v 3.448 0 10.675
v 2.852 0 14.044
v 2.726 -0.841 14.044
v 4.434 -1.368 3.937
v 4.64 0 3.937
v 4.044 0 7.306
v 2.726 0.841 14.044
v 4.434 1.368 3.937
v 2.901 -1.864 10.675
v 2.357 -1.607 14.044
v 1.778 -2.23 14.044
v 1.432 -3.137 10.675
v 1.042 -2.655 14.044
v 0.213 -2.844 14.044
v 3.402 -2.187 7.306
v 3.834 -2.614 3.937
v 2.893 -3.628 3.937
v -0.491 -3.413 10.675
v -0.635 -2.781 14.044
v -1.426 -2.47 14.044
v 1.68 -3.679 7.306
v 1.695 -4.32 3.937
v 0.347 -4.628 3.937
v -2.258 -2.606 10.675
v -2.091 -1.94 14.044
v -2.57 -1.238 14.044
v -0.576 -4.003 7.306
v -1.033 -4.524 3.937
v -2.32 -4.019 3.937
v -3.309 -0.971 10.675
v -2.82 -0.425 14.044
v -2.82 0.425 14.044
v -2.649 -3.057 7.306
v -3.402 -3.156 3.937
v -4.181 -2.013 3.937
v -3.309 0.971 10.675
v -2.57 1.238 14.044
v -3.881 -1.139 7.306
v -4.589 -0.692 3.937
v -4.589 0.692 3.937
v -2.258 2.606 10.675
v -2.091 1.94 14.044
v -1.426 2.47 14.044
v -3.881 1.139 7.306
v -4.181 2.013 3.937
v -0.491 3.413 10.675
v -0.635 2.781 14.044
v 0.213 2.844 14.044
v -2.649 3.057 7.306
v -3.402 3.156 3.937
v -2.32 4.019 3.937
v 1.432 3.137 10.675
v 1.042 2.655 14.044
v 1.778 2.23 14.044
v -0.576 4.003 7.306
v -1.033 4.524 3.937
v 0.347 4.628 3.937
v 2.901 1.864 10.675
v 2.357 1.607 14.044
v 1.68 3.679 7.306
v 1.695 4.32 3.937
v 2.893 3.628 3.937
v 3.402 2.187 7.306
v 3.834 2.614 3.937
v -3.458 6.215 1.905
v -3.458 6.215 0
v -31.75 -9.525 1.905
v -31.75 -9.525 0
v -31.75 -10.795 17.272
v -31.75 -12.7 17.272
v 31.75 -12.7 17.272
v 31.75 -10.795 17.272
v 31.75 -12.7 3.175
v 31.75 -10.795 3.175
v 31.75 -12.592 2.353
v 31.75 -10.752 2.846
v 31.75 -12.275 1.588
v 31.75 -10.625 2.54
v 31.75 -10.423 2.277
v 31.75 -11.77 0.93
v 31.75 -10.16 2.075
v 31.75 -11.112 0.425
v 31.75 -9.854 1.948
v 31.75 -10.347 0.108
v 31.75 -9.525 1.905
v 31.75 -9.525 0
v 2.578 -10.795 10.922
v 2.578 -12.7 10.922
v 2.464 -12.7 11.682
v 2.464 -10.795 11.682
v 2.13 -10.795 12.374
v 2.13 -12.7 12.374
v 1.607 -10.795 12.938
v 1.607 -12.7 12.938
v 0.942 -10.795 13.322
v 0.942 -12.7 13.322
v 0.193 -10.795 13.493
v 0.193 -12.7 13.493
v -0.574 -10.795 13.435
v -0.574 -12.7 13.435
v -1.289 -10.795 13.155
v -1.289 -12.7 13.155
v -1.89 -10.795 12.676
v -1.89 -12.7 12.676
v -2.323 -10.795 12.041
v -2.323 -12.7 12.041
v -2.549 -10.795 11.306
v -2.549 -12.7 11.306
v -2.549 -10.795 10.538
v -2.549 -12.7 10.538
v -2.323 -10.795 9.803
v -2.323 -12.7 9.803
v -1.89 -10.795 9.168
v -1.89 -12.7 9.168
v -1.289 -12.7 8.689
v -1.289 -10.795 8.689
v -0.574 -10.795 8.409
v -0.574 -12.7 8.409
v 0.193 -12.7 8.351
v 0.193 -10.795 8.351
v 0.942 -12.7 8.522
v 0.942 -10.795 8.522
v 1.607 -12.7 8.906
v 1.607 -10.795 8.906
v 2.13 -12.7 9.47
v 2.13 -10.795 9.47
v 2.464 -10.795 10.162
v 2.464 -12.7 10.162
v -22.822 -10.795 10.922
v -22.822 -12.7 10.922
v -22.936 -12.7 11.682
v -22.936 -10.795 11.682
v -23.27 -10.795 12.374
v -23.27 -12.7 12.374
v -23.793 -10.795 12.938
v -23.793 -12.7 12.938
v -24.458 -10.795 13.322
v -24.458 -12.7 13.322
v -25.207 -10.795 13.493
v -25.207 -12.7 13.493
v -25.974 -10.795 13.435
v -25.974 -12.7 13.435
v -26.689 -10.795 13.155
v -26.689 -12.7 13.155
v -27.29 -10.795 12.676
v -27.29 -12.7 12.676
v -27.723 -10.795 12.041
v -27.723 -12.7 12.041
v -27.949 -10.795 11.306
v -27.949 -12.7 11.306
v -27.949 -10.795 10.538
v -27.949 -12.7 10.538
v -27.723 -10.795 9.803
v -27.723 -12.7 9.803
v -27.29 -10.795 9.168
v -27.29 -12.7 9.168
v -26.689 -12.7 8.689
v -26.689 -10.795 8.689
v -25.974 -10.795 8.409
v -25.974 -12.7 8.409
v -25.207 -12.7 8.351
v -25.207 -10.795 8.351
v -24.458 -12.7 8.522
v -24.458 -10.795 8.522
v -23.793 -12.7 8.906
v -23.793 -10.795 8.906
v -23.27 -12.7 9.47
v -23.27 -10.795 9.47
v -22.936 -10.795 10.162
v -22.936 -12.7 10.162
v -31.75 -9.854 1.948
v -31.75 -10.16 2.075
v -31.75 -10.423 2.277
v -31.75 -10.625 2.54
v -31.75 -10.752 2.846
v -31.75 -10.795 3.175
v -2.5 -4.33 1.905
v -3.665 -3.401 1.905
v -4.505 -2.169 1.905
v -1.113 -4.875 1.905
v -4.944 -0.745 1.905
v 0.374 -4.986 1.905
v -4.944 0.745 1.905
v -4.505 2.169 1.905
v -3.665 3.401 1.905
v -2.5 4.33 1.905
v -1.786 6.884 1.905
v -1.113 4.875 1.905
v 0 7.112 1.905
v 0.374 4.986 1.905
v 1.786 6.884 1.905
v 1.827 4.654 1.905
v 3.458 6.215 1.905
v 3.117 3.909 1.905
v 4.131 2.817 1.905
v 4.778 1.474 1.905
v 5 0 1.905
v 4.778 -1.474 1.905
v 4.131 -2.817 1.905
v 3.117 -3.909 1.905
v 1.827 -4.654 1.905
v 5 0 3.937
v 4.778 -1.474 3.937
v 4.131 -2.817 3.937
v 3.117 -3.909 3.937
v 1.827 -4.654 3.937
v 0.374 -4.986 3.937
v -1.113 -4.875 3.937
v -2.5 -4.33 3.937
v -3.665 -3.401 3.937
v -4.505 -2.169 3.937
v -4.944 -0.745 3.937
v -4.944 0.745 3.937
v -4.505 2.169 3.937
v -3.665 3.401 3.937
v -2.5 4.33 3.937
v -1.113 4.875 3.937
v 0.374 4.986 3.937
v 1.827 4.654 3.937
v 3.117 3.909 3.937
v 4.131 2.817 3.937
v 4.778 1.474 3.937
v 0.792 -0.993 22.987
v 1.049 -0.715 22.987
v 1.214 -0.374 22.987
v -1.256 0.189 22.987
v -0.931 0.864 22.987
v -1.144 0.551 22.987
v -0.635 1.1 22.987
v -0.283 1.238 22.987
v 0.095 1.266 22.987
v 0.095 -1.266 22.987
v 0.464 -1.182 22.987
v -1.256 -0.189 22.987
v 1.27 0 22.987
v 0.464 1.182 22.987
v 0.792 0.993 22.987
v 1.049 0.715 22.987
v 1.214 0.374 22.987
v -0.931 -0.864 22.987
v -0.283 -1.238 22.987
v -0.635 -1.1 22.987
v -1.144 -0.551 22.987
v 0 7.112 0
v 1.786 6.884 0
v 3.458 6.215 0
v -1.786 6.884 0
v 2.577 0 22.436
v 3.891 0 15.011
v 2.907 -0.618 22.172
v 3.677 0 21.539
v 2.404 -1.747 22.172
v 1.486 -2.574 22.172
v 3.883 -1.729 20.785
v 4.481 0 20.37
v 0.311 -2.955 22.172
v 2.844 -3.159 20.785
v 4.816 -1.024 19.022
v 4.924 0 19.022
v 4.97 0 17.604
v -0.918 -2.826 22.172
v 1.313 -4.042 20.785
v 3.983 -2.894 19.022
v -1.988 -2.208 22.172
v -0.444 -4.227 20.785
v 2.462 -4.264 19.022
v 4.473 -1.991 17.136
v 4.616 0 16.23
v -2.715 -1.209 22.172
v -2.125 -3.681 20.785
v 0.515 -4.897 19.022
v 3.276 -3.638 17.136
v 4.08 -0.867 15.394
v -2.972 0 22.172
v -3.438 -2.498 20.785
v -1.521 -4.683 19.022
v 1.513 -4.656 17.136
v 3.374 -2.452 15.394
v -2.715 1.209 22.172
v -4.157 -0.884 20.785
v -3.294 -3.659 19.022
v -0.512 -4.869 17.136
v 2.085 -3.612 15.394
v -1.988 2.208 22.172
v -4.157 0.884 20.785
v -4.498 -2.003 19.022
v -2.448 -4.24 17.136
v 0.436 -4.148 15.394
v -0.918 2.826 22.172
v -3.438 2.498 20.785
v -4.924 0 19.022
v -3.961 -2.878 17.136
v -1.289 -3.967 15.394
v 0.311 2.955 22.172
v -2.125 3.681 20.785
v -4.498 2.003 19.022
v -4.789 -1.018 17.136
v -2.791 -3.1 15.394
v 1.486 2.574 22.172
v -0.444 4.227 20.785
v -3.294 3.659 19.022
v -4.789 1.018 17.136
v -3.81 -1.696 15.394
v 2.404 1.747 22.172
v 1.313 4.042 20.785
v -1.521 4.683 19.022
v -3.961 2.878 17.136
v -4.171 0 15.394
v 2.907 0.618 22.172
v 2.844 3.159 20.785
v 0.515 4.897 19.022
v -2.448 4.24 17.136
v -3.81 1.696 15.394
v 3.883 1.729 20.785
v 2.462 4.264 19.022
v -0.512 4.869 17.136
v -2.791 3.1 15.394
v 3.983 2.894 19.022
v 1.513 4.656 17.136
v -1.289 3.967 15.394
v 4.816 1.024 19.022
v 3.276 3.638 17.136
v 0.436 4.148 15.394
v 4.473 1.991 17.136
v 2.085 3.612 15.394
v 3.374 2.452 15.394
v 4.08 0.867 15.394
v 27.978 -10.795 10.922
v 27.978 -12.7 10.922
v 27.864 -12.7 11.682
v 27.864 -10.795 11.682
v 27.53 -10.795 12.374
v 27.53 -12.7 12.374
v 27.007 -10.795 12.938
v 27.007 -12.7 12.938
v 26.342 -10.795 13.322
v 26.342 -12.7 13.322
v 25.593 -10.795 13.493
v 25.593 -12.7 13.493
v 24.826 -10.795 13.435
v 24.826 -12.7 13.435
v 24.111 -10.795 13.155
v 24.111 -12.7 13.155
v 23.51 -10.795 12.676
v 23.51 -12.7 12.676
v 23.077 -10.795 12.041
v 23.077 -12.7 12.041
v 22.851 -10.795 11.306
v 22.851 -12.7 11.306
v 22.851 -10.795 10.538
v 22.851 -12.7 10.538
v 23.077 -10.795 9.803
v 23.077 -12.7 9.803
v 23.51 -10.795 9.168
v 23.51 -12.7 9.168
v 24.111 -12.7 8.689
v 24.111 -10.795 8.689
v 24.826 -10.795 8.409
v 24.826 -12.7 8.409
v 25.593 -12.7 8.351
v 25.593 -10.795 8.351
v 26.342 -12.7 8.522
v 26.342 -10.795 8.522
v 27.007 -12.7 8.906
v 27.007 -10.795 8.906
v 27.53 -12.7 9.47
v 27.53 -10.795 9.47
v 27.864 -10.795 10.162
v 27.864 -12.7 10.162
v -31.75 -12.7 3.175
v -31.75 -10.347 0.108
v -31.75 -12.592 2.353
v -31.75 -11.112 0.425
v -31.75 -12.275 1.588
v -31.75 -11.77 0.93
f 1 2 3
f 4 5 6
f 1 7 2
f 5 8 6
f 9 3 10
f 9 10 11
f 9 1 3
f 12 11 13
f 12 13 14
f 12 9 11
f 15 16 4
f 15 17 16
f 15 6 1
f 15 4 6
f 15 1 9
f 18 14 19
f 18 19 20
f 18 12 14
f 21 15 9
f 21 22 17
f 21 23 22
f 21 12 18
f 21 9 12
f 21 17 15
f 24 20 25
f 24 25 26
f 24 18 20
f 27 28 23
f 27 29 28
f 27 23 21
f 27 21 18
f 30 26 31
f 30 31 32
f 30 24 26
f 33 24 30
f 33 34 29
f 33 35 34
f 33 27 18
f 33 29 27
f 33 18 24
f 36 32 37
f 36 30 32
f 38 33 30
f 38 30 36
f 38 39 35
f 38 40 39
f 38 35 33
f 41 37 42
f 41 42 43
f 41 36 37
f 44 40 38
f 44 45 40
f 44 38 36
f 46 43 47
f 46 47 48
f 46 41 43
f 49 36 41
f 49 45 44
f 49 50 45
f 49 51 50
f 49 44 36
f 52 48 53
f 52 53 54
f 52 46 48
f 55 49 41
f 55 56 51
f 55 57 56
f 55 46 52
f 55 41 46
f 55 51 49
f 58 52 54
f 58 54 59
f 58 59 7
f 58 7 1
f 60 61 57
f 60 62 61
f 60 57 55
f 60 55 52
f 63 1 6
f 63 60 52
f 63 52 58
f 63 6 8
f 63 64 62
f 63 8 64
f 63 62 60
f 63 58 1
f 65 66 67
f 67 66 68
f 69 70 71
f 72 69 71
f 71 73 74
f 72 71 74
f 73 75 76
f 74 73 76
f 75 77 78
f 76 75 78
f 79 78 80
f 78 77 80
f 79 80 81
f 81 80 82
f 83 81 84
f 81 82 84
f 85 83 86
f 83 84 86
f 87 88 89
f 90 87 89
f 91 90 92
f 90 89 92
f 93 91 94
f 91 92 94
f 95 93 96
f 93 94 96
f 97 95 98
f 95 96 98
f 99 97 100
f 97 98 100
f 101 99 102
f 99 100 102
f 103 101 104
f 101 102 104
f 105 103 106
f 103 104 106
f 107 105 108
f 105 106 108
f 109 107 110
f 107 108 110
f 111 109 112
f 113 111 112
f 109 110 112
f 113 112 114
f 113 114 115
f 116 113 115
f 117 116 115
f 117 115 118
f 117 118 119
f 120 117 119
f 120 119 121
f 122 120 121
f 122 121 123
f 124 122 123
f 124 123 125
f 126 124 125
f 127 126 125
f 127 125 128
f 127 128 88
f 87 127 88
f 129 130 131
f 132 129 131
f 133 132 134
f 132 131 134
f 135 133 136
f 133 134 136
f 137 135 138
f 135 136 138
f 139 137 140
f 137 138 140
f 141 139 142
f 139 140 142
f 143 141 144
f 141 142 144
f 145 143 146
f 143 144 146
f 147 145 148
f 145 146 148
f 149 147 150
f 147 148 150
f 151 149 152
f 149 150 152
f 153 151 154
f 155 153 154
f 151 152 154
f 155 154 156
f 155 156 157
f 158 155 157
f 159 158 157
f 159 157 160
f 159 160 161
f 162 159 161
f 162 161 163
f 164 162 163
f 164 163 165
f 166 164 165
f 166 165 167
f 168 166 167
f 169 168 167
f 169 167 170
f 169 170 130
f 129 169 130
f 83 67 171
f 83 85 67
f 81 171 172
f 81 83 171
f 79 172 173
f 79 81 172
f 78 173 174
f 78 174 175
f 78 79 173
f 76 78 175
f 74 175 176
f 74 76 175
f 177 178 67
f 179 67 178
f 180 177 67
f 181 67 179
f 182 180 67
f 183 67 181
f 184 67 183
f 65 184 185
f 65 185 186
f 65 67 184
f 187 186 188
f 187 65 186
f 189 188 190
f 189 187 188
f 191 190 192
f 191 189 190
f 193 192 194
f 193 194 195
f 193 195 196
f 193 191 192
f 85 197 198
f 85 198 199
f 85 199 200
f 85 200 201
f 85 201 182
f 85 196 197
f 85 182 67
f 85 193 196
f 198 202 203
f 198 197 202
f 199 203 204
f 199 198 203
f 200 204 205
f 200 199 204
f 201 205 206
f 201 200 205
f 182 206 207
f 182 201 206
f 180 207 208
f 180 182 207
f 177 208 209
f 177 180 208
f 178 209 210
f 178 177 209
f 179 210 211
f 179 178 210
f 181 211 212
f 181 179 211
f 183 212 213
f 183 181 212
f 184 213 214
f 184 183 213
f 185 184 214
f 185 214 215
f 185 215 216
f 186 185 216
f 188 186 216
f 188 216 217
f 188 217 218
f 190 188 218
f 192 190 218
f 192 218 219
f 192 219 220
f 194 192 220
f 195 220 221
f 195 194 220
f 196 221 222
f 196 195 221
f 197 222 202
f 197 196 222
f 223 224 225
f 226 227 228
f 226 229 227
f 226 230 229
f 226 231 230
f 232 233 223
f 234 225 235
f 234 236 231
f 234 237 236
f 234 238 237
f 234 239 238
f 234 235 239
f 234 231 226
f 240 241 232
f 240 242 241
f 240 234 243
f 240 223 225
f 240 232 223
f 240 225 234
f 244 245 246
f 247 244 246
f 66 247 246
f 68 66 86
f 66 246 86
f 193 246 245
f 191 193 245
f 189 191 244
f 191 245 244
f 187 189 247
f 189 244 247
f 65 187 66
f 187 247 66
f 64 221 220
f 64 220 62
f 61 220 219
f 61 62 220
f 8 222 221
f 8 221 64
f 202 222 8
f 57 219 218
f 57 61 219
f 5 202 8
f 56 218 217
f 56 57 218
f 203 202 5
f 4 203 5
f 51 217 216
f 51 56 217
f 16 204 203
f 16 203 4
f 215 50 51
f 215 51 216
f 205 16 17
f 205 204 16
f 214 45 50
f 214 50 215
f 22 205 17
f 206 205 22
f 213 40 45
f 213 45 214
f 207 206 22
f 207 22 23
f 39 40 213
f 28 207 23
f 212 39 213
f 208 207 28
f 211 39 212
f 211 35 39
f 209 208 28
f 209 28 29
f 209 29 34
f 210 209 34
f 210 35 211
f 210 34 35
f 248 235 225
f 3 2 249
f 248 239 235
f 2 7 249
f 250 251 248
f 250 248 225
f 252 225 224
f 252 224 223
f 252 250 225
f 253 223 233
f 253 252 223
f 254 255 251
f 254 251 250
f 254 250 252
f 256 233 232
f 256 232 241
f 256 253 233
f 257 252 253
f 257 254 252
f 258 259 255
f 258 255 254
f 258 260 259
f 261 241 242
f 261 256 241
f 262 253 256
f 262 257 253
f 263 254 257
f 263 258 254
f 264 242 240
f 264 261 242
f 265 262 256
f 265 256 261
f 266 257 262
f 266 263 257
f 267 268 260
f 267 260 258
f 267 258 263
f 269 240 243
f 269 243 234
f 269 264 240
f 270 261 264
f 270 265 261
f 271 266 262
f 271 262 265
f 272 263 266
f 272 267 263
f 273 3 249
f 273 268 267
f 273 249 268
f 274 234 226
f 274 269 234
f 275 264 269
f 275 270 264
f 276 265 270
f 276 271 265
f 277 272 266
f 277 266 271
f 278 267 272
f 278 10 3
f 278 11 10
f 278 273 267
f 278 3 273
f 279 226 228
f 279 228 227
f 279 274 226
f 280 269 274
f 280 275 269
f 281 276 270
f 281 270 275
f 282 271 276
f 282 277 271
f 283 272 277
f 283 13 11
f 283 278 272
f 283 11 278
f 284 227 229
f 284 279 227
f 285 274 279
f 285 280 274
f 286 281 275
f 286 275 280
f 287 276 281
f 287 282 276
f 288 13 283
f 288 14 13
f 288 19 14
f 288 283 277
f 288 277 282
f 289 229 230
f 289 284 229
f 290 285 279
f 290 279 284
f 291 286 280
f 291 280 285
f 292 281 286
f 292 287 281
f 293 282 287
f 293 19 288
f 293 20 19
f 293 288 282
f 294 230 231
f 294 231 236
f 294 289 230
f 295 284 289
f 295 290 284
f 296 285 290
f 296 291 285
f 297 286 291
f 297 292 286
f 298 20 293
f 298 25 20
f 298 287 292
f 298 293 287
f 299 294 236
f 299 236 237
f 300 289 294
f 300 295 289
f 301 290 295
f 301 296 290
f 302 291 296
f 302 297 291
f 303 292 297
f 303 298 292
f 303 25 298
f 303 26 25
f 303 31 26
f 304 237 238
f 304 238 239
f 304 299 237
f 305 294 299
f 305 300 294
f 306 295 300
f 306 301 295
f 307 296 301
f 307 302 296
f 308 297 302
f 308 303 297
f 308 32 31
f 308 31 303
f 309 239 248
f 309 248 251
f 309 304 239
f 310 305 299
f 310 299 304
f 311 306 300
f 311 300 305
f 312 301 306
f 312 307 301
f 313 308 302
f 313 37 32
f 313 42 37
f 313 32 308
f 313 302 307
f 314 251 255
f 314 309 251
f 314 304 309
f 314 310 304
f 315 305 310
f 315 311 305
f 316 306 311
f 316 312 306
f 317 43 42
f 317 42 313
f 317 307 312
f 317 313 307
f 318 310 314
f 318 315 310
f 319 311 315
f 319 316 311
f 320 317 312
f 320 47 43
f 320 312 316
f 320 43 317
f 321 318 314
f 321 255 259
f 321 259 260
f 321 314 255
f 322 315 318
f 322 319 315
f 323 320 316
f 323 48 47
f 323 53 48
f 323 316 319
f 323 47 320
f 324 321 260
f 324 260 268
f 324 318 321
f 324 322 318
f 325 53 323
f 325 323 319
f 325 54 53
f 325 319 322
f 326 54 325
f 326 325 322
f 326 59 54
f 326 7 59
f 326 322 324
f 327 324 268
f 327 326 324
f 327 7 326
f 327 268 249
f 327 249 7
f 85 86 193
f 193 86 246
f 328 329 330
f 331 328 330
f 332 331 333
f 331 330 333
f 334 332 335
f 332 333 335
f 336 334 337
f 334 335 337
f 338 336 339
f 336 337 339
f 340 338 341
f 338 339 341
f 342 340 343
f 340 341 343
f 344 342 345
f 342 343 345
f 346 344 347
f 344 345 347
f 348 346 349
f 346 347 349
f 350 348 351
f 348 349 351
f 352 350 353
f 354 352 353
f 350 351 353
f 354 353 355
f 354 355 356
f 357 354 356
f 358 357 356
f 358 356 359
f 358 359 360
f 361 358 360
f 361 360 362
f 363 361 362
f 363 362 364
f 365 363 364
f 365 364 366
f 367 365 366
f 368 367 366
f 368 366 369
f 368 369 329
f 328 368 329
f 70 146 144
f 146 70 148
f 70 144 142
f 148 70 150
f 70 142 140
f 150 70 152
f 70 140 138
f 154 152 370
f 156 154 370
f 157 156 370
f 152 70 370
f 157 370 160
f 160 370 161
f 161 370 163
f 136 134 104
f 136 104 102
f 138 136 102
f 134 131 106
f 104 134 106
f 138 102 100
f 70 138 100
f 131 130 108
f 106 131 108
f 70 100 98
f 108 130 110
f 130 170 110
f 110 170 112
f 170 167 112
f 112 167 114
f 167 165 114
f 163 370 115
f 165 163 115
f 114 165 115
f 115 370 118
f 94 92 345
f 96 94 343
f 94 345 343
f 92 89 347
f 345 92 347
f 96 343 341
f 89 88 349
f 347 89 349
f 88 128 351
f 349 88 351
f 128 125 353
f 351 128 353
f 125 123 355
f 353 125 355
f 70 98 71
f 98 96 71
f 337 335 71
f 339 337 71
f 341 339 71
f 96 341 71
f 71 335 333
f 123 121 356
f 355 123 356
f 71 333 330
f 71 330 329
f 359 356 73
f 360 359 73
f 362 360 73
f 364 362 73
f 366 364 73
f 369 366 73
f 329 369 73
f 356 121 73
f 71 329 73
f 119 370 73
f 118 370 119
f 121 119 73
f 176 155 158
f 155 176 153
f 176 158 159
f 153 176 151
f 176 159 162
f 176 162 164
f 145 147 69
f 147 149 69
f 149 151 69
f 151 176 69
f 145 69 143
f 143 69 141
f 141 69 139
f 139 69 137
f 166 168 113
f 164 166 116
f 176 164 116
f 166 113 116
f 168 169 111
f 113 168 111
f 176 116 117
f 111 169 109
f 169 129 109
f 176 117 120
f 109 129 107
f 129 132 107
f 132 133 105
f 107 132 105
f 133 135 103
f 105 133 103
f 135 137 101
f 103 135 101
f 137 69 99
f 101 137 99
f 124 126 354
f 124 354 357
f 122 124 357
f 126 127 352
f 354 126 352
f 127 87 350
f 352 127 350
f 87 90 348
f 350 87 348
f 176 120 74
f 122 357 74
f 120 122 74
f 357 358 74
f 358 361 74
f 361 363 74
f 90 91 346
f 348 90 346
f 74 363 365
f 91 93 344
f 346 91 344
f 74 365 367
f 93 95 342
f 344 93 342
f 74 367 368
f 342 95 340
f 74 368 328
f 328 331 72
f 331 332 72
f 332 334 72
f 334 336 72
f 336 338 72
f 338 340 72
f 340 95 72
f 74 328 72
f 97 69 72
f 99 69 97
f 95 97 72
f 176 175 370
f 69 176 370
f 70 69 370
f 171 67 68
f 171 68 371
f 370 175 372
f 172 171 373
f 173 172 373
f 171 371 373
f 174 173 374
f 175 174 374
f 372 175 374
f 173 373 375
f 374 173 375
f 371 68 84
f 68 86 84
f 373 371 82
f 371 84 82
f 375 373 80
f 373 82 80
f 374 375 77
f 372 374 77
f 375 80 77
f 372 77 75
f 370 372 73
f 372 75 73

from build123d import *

# Parameters (mm, degrees)
EXTRUDE1_DEPTH     = 1.905
SKETCH4_W          = 63.5
SKETCH4_H          = 17.272
EXTRUDE2_DEPTH     = 1.905
FILLET1_R          = 1.27
FILLET2_R          = 3.175
SKETCH5_R          = 2.5781
CUT_EXTRUDE1_DEPTH = 42.217712552


with BuildPart() as part:
    # Sketch1 → Extrude1 (new body)
    with BuildSketch(Plane.XY):
        with BuildLine():
            Line((-31.75, -12.7), (31.75, -12.7))
            Line((31.75, -12.7), (31.75, -9.525))
            Line((31.75, -9.525), (3.457575677, 6.214958925))
            ThreePointArc((3.457575677, 6.214958925), (0, 7.112), (-3.457575677, 6.214958925))
            Line((-3.457575677, 6.214958925), (-31.75, -9.525))
            Line((-31.75, -9.525), (-31.75, -12.7))
        make_face()
    extrude(amount=EXTRUDE1_DEPTH)

    # Sketch4 → Extrude2 (add)
    with BuildSketch(Plane.XZ.offset(12.7)):
        with Locations((0, 8.636)):
            Rectangle(SKETCH4_W, SKETCH4_H)
    extrude(amount=-EXTRUDE2_DEPTH)

    # Fillet1
    fillet1_edges = [part.edges().sort_by_distance(p)[0] for p in [
        (0, -10.795, 1.905),
    ]]
    fillet(fillet1_edges, radius=FILLET1_R)

    # Fillet2
    fillet2_edges = [part.edges().sort_by_distance(p)[0] for p in [
        (0, -12.7, 0),
    ]]
    fillet(fillet2_edges, radius=FILLET2_R)

    # Sketch5 → Cut-Extrude1 (cut, through all)
    with BuildSketch(Plane.XZ.offset(12.7)):
        with Locations((-25.4, 10.922)):
            Circle(SKETCH5_R)
        with Locations((25.4, 10.922)):
            Circle(SKETCH5_R)
        with Locations((0, 10.922)):
            Circle(SKETCH5_R)
    extrude(amount=-CUT_EXTRUDE1_DEPTH, mode=Mode.SUBTRACT)

    # Sketch3 → Revolve1 (revolve)
    with BuildSketch(Plane.XZ):
        with BuildLine():
            Line((0, 1.905), (0, 22.987))
            Line((0, 22.987), (1.27, 22.987))
            ThreePointArc((1.27, 22.987), (4.92353173, 19.022090442), (2.852216719, 14.044294139))
            Line((2.852216719, 14.044294139), (4.640481928, 3.937))
            Line((4.640481928, 3.937), (5, 3.937))
            Line((5, 3.937), (5, 1.905))
            Line((5, 1.905), (0, 1.905))
        make_face()
    revolve(axis=Axis((0, 0, 1.905), (0, 0, -1)))


solid = part.part
